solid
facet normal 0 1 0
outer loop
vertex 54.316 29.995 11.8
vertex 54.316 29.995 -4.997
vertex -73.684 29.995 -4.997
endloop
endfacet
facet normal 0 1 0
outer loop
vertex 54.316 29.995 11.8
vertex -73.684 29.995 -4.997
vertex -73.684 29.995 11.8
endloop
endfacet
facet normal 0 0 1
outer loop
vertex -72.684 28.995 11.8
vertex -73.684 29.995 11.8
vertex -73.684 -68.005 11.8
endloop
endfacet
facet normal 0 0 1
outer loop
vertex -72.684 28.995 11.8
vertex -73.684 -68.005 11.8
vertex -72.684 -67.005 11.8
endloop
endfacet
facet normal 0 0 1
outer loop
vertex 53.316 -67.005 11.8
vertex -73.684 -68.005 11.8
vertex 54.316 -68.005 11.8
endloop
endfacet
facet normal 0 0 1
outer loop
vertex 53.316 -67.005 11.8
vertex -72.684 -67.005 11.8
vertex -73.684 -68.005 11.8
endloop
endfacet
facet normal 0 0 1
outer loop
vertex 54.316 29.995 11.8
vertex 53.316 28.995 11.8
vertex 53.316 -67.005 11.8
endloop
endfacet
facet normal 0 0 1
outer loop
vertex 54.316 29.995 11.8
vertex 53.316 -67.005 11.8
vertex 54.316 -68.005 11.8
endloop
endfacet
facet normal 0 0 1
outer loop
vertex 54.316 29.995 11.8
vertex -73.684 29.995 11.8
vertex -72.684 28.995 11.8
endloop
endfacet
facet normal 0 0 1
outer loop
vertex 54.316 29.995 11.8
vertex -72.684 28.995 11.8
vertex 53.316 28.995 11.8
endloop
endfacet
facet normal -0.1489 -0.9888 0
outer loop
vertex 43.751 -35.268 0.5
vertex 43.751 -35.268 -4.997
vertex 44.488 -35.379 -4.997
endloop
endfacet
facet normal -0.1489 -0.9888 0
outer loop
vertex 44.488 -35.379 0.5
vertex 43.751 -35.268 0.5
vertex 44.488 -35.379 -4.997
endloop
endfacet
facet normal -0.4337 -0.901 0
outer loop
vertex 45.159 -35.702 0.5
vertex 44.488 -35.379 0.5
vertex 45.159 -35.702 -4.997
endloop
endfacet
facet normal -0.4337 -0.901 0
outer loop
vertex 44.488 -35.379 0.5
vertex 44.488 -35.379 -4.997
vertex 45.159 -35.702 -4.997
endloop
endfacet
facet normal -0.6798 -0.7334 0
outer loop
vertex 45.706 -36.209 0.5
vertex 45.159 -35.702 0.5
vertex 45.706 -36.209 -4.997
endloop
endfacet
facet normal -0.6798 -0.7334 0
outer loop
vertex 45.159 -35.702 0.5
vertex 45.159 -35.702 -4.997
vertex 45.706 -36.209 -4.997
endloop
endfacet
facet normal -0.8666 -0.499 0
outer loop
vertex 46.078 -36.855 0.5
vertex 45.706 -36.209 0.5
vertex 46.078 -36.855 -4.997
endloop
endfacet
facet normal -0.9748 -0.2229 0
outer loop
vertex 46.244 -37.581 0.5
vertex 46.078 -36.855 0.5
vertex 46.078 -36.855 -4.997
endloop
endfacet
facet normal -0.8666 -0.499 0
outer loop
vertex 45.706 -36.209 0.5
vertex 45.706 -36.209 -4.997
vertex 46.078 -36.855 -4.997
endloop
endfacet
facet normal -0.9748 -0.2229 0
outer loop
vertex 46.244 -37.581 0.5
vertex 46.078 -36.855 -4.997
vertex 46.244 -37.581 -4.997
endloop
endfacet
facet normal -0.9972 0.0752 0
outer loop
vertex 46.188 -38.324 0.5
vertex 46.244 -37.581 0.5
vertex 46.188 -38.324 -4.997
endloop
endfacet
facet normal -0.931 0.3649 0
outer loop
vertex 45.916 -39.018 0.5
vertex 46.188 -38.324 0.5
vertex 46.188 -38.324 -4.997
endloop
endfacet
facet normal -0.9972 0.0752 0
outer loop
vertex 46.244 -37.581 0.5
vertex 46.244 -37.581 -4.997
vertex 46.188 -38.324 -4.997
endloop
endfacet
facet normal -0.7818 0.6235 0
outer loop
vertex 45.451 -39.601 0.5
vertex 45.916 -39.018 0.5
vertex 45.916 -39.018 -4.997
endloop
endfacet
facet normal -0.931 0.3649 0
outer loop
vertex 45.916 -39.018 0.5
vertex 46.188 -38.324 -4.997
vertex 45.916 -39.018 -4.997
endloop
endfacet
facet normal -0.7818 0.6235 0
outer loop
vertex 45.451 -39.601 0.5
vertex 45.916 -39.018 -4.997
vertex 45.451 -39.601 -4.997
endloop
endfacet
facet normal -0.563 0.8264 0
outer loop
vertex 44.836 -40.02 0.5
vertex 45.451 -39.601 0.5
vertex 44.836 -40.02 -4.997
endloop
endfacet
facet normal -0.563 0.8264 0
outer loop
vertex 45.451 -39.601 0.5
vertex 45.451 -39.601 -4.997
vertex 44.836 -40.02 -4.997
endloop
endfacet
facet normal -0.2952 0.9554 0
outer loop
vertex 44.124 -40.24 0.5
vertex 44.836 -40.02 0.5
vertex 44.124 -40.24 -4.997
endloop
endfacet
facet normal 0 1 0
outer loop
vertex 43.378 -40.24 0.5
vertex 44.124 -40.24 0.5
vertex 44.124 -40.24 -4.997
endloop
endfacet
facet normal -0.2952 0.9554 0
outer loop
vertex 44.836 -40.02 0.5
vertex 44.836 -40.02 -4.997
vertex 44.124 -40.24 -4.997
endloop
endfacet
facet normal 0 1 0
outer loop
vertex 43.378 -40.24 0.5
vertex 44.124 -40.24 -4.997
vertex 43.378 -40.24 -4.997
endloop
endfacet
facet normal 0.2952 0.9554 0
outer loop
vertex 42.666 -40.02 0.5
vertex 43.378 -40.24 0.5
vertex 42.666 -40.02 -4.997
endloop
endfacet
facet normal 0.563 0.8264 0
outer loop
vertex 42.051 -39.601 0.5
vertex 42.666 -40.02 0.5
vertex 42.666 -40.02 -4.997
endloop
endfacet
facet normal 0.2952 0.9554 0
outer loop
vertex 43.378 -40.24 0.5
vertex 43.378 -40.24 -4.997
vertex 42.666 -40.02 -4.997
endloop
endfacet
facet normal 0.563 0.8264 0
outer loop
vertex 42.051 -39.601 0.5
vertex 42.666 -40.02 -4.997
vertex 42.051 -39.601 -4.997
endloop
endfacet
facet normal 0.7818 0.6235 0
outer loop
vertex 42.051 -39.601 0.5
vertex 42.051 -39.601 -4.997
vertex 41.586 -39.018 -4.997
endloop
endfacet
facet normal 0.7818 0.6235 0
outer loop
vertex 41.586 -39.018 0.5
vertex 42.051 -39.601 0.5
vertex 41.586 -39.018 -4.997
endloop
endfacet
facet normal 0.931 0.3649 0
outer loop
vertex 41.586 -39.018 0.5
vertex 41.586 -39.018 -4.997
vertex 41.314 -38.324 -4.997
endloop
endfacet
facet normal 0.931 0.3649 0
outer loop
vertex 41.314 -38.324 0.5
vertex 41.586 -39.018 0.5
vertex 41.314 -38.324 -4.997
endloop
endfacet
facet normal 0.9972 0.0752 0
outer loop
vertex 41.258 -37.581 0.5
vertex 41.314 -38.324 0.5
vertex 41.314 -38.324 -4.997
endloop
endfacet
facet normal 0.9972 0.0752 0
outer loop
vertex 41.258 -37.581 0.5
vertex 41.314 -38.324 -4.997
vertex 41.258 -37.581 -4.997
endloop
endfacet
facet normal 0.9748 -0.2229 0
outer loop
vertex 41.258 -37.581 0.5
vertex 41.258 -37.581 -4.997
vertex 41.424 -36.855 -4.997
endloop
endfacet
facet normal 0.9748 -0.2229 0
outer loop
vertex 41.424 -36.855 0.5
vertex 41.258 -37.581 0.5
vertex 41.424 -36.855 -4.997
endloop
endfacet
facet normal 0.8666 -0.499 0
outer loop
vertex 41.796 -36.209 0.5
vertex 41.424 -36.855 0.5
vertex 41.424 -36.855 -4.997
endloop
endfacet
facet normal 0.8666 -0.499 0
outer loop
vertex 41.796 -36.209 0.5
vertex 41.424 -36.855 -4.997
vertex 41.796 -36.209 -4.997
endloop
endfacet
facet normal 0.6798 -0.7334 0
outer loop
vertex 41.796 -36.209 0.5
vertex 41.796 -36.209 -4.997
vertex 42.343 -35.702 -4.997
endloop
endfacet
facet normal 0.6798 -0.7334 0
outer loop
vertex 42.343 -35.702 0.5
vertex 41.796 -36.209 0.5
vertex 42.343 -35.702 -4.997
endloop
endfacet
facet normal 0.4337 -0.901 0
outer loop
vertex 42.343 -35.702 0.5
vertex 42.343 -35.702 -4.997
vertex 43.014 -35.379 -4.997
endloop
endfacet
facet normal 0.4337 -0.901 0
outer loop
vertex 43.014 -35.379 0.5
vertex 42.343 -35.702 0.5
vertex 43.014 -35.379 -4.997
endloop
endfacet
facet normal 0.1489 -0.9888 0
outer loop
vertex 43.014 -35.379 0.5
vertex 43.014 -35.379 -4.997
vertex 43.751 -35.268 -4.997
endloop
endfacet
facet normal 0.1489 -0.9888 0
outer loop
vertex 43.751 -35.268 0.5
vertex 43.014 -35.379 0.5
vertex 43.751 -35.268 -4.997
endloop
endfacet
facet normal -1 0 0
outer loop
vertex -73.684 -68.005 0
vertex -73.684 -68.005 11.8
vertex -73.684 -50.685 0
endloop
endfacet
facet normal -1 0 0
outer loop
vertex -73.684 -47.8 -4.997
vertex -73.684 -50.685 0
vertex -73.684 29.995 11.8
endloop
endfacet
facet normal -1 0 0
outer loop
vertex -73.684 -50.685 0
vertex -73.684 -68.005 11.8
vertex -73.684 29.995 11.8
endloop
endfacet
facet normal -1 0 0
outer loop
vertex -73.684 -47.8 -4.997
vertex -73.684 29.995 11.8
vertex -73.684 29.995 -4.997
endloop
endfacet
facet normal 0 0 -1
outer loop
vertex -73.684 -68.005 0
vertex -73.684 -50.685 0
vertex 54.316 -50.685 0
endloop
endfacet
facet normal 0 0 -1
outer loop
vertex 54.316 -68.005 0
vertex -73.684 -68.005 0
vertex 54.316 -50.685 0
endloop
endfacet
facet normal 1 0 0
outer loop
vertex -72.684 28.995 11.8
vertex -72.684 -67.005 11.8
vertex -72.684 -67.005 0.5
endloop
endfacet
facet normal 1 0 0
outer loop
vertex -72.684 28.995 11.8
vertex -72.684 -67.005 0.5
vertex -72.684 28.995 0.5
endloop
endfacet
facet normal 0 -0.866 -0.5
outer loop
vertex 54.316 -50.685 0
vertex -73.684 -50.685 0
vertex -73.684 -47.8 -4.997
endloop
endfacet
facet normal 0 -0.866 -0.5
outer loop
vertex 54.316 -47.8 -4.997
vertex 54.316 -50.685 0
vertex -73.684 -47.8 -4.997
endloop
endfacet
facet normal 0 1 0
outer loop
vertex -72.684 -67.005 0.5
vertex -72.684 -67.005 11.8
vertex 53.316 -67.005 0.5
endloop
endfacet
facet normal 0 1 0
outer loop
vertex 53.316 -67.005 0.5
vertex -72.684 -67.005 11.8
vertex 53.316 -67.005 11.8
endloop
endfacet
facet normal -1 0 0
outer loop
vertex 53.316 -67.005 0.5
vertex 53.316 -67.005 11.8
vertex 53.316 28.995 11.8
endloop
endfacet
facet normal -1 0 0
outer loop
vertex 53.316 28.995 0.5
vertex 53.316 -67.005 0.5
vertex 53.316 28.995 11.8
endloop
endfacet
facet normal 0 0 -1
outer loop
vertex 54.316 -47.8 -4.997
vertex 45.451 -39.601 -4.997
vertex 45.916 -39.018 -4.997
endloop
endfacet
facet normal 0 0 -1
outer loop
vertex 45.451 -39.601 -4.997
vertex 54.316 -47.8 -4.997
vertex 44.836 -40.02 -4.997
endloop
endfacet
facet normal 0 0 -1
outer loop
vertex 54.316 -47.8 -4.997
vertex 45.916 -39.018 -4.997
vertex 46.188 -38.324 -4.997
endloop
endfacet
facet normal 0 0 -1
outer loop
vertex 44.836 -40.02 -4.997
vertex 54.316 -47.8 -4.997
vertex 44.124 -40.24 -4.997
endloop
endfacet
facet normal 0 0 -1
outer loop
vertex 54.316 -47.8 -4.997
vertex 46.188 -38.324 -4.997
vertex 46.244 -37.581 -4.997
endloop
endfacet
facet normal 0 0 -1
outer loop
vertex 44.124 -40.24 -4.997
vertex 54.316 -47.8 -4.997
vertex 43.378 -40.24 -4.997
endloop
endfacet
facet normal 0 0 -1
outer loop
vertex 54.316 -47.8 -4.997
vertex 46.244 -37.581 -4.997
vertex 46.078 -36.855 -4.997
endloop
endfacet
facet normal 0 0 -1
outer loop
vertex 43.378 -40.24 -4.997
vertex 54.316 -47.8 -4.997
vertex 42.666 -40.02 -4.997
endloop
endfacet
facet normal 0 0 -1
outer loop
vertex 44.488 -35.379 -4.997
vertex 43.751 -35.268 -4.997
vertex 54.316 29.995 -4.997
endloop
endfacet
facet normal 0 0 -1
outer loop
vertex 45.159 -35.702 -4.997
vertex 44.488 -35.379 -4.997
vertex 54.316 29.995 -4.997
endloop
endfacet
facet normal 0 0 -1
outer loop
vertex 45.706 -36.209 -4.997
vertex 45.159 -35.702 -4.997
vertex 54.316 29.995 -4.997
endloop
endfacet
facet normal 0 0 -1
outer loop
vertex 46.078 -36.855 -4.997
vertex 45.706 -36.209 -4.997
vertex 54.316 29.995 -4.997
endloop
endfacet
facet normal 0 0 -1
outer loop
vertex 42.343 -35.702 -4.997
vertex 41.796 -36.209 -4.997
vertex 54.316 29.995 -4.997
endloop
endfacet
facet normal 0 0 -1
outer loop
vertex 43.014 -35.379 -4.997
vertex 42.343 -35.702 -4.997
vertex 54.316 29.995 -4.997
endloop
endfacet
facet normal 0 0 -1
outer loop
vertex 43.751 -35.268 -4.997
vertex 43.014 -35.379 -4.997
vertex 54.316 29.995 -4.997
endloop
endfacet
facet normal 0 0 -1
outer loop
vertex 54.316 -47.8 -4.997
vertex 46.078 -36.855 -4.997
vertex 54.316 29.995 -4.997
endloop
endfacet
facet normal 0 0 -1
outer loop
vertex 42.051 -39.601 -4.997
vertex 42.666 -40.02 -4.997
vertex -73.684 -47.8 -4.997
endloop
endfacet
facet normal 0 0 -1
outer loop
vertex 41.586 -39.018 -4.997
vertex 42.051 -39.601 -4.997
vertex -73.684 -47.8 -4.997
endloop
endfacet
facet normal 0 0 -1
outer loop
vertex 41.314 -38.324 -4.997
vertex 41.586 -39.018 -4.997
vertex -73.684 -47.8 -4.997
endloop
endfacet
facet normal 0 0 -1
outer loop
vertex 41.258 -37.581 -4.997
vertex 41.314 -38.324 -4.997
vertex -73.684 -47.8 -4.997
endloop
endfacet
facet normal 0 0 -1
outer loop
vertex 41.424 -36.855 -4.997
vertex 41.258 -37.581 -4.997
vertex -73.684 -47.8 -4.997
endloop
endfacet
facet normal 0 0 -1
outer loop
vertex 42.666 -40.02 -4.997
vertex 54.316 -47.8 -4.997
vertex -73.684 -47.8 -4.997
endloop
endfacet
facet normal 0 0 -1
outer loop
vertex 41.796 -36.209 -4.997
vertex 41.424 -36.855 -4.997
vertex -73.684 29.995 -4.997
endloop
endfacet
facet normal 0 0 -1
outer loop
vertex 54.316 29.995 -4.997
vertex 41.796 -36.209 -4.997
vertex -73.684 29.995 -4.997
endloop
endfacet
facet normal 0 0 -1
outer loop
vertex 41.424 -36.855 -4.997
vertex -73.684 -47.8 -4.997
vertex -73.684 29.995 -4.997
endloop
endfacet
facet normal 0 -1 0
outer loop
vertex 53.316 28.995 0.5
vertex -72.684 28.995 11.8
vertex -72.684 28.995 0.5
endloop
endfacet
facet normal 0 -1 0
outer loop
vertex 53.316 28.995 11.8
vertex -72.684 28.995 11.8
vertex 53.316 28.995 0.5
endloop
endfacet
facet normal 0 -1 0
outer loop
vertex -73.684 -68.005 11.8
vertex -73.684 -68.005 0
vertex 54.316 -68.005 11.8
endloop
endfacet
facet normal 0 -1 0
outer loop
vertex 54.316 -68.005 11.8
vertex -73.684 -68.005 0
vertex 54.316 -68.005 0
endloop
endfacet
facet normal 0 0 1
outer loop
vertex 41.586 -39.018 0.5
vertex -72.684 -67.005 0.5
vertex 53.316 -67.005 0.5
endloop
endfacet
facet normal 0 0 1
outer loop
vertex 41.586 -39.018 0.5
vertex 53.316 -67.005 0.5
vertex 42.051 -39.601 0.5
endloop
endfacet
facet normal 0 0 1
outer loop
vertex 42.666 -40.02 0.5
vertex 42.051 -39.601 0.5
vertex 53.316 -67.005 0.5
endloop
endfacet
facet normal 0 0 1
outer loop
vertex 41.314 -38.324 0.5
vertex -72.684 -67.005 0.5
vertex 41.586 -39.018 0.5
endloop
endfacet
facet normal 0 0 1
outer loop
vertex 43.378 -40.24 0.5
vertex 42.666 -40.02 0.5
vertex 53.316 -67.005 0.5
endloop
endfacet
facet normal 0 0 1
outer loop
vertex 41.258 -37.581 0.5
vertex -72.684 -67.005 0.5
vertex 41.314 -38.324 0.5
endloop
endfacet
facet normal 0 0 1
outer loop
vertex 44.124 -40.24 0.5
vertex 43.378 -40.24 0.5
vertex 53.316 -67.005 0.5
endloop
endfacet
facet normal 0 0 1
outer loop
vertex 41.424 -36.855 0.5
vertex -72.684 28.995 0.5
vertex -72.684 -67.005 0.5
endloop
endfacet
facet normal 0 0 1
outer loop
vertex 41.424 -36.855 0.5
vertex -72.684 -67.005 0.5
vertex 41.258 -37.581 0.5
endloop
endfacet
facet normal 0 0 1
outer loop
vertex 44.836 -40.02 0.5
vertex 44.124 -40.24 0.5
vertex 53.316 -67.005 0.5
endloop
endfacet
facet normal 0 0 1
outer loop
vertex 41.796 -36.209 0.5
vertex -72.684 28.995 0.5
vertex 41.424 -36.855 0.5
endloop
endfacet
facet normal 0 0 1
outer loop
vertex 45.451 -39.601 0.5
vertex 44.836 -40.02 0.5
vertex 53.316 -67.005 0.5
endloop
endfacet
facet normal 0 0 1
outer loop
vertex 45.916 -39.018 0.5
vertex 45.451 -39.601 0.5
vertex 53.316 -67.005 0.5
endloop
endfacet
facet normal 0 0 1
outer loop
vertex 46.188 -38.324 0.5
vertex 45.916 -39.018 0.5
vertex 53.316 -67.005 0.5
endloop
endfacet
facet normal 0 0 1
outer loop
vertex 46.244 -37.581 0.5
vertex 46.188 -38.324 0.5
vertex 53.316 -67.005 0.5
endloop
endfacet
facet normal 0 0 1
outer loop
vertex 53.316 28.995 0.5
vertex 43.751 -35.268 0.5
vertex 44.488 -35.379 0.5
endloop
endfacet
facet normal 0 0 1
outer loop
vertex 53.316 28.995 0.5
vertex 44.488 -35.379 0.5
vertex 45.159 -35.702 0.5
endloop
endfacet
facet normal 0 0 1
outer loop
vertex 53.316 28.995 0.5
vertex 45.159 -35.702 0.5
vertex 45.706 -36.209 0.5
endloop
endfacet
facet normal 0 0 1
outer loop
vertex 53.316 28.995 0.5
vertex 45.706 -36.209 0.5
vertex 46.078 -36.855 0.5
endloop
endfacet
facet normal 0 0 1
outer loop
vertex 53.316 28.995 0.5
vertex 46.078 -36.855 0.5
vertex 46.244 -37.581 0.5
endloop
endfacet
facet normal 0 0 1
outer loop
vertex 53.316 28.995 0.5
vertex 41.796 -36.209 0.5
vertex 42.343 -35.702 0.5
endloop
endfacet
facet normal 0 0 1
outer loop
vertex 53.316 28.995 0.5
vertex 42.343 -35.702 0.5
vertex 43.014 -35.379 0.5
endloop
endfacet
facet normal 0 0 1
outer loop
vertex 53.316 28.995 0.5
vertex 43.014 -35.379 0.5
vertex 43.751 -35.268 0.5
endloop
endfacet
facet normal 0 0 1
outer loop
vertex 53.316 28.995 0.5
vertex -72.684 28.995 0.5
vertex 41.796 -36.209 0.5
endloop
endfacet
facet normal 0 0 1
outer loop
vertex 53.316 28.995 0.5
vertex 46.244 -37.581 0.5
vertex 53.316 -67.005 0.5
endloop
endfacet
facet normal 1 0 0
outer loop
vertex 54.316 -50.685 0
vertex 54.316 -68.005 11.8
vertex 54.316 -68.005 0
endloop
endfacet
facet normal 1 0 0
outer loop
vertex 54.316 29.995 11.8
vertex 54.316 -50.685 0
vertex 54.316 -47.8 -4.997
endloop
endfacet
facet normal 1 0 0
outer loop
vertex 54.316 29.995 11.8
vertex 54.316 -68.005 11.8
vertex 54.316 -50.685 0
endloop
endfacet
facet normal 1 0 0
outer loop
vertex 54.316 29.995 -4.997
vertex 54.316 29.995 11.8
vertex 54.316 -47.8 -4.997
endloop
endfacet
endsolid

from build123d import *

# Parameters (mm, degrees)
CROQUIS1_W              = 128
CROQUIS1_H              = 98
SALIENTE_EXTRUIR1_DEPTH = 11.8
CROQUIS2_W              = 126
CROQUIS2_H              = 96
CORTAR_EXTRUIR1_DEPTH   = 11.3
SALIENTE_EXTRUIR2_DEPTH = 128
CROQUIS7_R              = 2.5
CORTAR_EXTRUIR2_DEPTH   = 22


with BuildPart() as part:
    # Croquis1 → Saliente-Extruir1 (new body)
    with BuildSketch(Plane.XY):
        with Locations((-9.684466696, -19.00455338)):
            Rectangle(CROQUIS1_W, CROQUIS1_H)
    extrude(amount=SALIENTE_EXTRUIR1_DEPTH)

    # Croquis2 → Cortar-Extruir1 (cut)
    with BuildSketch(Plane.XY.offset(11.8)):
        with Locations((-9.684466696, -19.00455338)):
            Rectangle(CROQUIS2_W, CROQUIS2_H)
    extrude(amount=-CORTAR_EXTRUIR1_DEPTH, mode=Mode.SUBTRACT)

    # Croquis5 → Saliente-Extruir2 (add)
    with BuildSketch(Plane.ZY.offset(73.684466696)):
        Polygon((0, -50.68455338), (-4.99696658, -47.79955338), (-4.99696658, 29.99544662), (0, 29.99544662), align=None)
    extrude(amount=-SALIENTE_EXTRUIR2_DEPTH)

    # Croquis7 → Cortar-Extruir2 (cut)
    with BuildSketch(Plane(origin=(0, 0, -4.99696658), x_dir=(-1, 0, 0), z_dir=(0, 0, -1))):
        with Locations(Location((-43.751056656, -37.767924802, 0), (0, 0, 90))):
            Circle(CROQUIS7_R)
    extrude(amount=-CORTAR_EXTRUIR2_DEPTH, mode=Mode.SUBTRACT)


solid = part.part
